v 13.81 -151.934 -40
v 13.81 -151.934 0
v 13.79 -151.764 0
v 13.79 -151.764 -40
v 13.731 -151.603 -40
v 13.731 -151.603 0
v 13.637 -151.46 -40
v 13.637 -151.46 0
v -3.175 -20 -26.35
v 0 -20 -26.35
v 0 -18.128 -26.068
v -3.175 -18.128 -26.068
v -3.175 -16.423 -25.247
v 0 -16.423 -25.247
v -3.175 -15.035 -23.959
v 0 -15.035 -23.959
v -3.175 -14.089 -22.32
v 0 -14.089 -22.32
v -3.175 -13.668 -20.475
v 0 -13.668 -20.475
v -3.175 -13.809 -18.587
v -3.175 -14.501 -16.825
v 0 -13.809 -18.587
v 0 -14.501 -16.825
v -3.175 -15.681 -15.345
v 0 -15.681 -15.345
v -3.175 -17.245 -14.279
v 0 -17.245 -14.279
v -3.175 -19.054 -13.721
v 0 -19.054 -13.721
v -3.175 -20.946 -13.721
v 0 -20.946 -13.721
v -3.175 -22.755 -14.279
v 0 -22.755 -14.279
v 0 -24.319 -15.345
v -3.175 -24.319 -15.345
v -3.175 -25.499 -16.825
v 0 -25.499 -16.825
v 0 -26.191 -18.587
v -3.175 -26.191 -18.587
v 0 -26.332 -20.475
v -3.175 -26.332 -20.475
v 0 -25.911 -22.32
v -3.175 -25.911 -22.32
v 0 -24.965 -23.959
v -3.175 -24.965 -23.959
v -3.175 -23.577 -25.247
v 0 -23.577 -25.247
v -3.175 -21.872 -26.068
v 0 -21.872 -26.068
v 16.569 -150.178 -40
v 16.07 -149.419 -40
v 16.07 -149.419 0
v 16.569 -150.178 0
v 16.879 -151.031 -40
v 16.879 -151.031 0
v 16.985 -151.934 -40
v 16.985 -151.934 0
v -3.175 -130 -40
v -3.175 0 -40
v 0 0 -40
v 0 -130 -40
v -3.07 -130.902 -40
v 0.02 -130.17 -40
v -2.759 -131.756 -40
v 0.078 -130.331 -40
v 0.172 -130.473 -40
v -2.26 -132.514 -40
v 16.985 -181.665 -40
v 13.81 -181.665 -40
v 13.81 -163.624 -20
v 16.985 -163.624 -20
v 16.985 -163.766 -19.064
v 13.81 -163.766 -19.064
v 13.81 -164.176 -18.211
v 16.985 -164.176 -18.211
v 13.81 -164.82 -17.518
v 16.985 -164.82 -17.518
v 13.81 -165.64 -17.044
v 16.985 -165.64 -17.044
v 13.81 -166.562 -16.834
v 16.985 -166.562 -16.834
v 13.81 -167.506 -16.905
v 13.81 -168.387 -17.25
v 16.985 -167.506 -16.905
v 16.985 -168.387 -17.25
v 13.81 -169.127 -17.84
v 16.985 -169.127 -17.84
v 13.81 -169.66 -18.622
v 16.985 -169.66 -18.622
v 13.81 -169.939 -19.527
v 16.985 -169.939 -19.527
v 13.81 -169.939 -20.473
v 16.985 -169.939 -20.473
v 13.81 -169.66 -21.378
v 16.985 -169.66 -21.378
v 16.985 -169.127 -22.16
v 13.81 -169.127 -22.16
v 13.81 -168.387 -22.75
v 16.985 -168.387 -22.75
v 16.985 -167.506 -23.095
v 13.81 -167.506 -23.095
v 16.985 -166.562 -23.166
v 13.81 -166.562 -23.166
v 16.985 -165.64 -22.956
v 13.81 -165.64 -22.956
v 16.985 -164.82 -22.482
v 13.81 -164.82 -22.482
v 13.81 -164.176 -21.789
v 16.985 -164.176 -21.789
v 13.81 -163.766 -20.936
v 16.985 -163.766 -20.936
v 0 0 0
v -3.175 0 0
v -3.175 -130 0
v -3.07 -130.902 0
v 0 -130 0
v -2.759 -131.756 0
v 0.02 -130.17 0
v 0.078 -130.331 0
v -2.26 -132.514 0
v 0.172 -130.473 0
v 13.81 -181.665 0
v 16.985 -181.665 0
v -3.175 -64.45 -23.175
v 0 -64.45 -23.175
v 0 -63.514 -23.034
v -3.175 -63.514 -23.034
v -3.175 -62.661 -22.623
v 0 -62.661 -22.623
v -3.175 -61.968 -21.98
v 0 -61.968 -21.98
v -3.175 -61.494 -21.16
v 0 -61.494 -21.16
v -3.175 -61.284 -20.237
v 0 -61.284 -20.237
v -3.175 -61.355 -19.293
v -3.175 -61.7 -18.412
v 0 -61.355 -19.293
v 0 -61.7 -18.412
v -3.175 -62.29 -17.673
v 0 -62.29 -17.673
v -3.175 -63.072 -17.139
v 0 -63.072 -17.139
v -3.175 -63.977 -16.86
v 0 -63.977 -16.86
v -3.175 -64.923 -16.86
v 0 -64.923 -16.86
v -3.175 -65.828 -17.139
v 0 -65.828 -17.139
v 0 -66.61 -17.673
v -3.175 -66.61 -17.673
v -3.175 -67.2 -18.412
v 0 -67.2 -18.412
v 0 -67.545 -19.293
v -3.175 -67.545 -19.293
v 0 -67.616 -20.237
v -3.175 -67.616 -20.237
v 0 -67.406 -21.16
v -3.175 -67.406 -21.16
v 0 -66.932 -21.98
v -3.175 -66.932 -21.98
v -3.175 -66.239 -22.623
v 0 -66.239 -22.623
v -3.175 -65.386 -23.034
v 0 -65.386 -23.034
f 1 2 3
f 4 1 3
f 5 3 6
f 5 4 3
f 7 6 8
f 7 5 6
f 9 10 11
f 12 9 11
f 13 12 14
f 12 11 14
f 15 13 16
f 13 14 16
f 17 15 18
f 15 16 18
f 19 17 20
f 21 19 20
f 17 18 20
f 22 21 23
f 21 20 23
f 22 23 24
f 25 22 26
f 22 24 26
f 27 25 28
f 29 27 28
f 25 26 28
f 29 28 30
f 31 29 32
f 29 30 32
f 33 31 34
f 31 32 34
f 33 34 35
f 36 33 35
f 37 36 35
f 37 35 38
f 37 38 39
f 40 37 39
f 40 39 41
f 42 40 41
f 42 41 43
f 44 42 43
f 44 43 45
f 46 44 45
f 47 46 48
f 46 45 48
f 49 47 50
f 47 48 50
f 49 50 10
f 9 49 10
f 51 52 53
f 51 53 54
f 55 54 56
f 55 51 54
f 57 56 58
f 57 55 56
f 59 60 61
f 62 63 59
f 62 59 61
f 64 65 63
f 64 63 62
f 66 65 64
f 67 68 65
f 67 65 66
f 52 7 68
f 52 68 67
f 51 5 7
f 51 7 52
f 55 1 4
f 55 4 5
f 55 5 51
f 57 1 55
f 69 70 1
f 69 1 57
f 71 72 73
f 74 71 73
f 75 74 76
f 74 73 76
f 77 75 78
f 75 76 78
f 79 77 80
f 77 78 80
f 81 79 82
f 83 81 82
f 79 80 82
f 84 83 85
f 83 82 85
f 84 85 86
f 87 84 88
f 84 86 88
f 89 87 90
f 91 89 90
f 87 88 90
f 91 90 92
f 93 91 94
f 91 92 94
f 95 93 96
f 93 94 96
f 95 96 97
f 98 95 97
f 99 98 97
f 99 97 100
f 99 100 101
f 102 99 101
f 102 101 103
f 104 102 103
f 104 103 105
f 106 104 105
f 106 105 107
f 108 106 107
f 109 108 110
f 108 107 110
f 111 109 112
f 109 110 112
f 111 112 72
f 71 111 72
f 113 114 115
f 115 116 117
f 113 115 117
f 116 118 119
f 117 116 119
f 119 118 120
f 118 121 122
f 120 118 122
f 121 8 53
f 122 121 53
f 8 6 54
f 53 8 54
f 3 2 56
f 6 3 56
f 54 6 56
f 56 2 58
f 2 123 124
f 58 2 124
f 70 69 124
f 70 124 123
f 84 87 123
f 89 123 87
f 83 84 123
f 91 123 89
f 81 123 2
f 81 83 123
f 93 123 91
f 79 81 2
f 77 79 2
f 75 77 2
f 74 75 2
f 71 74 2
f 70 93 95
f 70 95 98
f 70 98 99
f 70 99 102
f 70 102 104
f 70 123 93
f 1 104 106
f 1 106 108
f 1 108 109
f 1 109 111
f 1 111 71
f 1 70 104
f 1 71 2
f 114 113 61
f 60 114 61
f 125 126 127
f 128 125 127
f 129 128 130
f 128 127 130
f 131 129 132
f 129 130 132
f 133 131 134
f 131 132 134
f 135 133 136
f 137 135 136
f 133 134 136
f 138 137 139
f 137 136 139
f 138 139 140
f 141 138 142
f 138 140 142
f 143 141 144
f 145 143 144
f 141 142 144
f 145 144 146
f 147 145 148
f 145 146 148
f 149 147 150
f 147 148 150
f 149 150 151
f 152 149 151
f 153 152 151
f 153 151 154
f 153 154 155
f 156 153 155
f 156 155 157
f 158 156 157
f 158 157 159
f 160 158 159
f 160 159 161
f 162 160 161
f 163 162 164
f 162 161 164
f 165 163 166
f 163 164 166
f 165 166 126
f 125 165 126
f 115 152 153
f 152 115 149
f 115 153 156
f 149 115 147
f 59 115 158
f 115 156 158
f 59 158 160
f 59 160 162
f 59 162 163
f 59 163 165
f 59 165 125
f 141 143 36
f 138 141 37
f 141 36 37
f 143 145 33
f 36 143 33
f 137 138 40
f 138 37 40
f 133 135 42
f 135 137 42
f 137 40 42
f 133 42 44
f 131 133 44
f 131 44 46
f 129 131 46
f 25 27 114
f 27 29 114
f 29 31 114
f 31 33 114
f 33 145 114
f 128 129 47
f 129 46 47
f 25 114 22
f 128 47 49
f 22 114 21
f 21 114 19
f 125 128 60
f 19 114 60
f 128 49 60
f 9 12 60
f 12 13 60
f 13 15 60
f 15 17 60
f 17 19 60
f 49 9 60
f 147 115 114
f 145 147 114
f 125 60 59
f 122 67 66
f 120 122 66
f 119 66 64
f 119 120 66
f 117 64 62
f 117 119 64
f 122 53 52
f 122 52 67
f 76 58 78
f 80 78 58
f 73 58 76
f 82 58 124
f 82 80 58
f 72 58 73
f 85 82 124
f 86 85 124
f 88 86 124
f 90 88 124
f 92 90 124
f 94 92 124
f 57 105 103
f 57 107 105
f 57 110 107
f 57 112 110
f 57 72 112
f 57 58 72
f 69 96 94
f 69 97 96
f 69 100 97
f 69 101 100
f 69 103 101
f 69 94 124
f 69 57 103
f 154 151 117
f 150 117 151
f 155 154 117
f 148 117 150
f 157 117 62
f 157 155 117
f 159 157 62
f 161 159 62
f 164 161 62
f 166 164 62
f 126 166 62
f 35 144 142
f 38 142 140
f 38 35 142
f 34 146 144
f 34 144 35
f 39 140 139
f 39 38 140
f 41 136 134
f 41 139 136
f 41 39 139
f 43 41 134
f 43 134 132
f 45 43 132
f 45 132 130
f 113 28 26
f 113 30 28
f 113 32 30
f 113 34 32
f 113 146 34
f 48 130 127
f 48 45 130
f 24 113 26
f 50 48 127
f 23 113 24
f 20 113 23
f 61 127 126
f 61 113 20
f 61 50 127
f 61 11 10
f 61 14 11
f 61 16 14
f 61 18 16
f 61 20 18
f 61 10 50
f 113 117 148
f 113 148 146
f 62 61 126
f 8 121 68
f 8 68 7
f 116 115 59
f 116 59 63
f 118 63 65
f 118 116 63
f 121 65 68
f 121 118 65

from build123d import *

# Parameters (mm, degrees)
SKETCH1_W          = 40
SKETCH1_H          = 130
SKETCH1_R          = 6.35
SKETCH1_R_2        = 3.175
BASE_FLANGE1_DEPTH = 3.175
EDGE_FLANGE1_DEPTH = 40
EDGE_FLANGE2_DEPTH = 40
SKETCH20_R         = 3.175
CUT_EXTRUDE3_DEPTH = 3.175


# Sheet-metal steps are written as plain solids
with BuildPart() as part:
    # Sketch1 → Base-Flange1 (new body)
    with BuildSketch(Plane(origin=(0, 0, 0), x_dir=(0, 0, -1), z_dir=(1, 0, 0))):
        with Locations((20, -65)):
            Rectangle(SKETCH1_W, SKETCH1_H)
        with Locations((20, -20)):
            Circle(SKETCH1_R, mode=Mode.SUBTRACT)
        with Locations((20, -64.45)):
            Circle(SKETCH1_R_2, mode=Mode.SUBTRACT)
    extrude(amount=-BASE_FLANGE1_DEPTH)

    # Edge-Flange1 section (across the edge) → Edge-Flange1 (add)
    with BuildSketch(Plane(origin=(0, -130.268100475, 0), x_dir=(0.7660444431189817, 0.642787609686535, 0), z_dir=(0, 0, -1))):
        with BuildLine():
            Line((-3.175, 0.268100475), (-3.175, 25))
            Line((-3.175, 25), (0, 25))
            Line((0, 25), (0, 0.268100475))
            ThreePointArc((0, 0.268100475), (0.044422416, 0.016168437), (0.172331663, -0.205376879))
            Line((0.172331663, -0.205376879), (-2.259859444, -2.246227539))
            ThreePointArc((-2.259859444, -2.246227539), (-2.939101655, -1.069745518), (-3.175, 0.268100475))
        make_face()
    extrude(amount=EDGE_FLANGE1_DEPTH)

    # Edge-Flange2 section (across the edge) → Edge-Flange2 (add)
    with BuildSketch(Plane(origin=(13.809830798, -151.665439092, -40), x_dir=(-1, 0, 0), z_dir=(0, 0, 1))):
        with BuildLine():
            Line((-3.175, 0.268100475), (-3.175, 30))
            Line((-3.175, 30), (0, 30))
            Line((0, 30), (0, 0.268100475))
            ThreePointArc((0, 0.268100475), (0.044422416, 0.016168437), (0.172331663, -0.205376879))
            Line((0.172331663, -0.205376879), (-2.259859444, -2.246227539))
            ThreePointArc((-2.259859444, -2.246227539), (-2.939101655, -1.069745518), (-3.175, 0.268100475))
        make_face()
    extrude(amount=EDGE_FLANGE2_DEPTH)

    # Sketch20 → Cut-Extrude3 (cut)
    with BuildSketch(Plane(origin=(16.984830798, 0, 0), x_dir=(0, 0, -1), z_dir=(1, 0, 0))):
        with Locations(Location((20, -166.799489329, 0), (0, 0, 90))):
            Circle(SKETCH20_R)
    extrude(amount=-CUT_EXTRUDE3_DEPTH, mode=Mode.SUBTRACT)


solid = part.part
